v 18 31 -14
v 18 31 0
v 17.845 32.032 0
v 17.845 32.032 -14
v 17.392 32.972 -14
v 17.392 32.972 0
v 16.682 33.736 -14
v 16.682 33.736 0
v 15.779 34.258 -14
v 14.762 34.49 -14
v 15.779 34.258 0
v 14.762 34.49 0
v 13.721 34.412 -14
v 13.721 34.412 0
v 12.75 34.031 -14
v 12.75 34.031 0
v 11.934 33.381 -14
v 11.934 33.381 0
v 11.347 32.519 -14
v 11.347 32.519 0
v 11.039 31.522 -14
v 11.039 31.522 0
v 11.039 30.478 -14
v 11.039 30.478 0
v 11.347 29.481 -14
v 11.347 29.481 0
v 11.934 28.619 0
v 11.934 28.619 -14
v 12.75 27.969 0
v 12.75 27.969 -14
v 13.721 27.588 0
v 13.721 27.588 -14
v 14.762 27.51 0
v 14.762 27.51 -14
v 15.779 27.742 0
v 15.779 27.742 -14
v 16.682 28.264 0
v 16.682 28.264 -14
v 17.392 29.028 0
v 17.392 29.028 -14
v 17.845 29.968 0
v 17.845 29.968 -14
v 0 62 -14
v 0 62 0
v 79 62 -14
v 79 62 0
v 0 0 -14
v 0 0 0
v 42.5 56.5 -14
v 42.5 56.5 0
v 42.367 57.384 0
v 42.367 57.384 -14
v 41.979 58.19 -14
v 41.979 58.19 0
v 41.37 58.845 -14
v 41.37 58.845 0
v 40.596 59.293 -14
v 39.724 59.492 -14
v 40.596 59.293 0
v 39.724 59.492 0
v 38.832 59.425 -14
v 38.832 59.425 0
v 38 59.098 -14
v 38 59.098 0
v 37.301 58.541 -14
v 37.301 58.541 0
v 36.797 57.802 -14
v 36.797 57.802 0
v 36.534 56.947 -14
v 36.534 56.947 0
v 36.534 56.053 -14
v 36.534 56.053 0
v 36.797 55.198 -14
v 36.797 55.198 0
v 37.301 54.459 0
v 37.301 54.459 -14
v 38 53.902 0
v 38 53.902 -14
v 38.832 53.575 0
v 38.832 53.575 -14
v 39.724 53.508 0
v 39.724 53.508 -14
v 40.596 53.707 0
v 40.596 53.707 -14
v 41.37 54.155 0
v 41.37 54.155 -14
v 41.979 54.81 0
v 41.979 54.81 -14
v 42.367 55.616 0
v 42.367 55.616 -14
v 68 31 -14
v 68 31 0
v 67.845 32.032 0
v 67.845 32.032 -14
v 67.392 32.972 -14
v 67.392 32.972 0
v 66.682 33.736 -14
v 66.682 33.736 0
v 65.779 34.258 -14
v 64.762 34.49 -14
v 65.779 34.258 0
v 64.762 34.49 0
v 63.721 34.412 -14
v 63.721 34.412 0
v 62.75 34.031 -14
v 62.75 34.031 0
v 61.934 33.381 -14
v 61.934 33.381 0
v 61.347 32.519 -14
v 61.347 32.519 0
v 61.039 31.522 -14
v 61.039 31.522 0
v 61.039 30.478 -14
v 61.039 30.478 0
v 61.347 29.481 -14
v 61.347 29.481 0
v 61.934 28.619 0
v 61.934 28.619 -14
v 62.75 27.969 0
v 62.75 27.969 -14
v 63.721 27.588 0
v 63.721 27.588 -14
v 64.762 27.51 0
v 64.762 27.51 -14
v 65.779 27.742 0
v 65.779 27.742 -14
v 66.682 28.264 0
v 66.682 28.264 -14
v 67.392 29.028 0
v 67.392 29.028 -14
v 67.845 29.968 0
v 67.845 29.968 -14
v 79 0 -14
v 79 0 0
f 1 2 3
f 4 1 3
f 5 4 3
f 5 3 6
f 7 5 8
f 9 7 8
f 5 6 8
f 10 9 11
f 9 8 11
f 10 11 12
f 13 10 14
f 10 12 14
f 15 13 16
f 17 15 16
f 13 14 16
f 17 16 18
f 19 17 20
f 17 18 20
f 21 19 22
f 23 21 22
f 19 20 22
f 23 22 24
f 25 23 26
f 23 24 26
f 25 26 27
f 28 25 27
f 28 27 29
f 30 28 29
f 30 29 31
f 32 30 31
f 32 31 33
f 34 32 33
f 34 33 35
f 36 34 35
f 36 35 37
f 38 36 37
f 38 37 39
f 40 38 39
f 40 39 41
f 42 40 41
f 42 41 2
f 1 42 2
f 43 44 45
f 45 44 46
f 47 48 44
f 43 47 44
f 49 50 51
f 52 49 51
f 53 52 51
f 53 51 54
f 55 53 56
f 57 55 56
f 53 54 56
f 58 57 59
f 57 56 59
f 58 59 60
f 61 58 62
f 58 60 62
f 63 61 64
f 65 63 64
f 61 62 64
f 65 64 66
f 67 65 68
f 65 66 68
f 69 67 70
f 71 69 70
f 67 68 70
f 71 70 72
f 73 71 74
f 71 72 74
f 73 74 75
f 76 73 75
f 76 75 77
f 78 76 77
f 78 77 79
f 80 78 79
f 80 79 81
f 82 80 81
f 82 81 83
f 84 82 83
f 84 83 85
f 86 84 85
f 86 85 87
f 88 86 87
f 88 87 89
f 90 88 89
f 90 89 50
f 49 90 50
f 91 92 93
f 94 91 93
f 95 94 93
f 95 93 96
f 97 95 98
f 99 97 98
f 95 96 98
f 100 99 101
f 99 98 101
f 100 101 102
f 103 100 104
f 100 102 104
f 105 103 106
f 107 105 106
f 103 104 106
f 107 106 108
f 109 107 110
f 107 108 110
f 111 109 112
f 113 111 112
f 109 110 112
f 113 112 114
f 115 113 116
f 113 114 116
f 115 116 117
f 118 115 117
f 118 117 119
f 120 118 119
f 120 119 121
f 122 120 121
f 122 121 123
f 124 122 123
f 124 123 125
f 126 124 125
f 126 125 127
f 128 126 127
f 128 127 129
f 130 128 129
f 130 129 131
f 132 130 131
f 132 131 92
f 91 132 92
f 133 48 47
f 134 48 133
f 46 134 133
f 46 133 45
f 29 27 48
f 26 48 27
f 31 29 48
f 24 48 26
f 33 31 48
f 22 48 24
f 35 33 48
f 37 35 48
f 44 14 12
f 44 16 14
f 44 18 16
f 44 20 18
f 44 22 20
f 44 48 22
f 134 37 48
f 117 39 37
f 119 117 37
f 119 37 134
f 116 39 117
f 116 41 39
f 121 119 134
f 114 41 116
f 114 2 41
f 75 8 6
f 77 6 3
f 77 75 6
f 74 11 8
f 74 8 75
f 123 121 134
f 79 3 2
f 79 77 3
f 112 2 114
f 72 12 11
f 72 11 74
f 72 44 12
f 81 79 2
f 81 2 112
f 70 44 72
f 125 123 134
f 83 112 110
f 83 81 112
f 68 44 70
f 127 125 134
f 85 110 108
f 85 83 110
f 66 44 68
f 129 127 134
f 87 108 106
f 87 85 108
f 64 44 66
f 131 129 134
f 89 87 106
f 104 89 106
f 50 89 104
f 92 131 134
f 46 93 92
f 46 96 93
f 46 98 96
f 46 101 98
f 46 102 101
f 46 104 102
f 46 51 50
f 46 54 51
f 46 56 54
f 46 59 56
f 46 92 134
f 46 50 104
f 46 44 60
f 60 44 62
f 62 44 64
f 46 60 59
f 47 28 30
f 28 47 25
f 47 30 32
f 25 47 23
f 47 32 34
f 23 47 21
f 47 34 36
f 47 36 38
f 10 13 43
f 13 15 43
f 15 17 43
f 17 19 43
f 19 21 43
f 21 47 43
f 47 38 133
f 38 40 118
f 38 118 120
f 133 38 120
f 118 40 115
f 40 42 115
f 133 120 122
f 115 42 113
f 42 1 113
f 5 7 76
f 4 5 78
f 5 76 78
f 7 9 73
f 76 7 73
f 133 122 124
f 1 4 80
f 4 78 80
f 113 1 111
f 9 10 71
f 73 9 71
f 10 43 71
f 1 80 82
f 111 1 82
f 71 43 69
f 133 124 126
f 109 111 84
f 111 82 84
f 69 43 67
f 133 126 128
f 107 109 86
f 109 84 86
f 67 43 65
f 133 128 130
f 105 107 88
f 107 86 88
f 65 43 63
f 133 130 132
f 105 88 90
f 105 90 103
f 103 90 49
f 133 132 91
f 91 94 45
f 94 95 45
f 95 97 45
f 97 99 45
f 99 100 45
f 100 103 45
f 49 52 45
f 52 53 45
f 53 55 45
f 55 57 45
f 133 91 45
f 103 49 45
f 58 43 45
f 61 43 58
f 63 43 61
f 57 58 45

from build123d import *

# Parameters (mm, degrees)
F0_W     = 79
F0_H     = 62
F2_DEPTH = 14
F1_R     = 3.5
F1_R_2   = 3
F3_DEPTH = 14.001


with BuildPart() as f2:
    # F0 (on Top) → F2 (new body)
    with BuildSketch(Plane.XY):
        with Locations((39.5, 31)):
            Rectangle(F0_W, F0_H)
    extrude(amount=-F2_DEPTH)

    # F1 (on face) → F3 (cut, through all)
    with BuildSketch(Plane.XY):
        with Locations((14.5, 31)):
            Circle(F1_R)
        with Locations((39.5, 56.5)):
            Circle(F1_R_2)
        with Locations((64.5, 31)):
            Circle(F1_R)
    extrude(amount=-F3_DEPTH, mode=Mode.SUBTRACT)


solid = f2.part
